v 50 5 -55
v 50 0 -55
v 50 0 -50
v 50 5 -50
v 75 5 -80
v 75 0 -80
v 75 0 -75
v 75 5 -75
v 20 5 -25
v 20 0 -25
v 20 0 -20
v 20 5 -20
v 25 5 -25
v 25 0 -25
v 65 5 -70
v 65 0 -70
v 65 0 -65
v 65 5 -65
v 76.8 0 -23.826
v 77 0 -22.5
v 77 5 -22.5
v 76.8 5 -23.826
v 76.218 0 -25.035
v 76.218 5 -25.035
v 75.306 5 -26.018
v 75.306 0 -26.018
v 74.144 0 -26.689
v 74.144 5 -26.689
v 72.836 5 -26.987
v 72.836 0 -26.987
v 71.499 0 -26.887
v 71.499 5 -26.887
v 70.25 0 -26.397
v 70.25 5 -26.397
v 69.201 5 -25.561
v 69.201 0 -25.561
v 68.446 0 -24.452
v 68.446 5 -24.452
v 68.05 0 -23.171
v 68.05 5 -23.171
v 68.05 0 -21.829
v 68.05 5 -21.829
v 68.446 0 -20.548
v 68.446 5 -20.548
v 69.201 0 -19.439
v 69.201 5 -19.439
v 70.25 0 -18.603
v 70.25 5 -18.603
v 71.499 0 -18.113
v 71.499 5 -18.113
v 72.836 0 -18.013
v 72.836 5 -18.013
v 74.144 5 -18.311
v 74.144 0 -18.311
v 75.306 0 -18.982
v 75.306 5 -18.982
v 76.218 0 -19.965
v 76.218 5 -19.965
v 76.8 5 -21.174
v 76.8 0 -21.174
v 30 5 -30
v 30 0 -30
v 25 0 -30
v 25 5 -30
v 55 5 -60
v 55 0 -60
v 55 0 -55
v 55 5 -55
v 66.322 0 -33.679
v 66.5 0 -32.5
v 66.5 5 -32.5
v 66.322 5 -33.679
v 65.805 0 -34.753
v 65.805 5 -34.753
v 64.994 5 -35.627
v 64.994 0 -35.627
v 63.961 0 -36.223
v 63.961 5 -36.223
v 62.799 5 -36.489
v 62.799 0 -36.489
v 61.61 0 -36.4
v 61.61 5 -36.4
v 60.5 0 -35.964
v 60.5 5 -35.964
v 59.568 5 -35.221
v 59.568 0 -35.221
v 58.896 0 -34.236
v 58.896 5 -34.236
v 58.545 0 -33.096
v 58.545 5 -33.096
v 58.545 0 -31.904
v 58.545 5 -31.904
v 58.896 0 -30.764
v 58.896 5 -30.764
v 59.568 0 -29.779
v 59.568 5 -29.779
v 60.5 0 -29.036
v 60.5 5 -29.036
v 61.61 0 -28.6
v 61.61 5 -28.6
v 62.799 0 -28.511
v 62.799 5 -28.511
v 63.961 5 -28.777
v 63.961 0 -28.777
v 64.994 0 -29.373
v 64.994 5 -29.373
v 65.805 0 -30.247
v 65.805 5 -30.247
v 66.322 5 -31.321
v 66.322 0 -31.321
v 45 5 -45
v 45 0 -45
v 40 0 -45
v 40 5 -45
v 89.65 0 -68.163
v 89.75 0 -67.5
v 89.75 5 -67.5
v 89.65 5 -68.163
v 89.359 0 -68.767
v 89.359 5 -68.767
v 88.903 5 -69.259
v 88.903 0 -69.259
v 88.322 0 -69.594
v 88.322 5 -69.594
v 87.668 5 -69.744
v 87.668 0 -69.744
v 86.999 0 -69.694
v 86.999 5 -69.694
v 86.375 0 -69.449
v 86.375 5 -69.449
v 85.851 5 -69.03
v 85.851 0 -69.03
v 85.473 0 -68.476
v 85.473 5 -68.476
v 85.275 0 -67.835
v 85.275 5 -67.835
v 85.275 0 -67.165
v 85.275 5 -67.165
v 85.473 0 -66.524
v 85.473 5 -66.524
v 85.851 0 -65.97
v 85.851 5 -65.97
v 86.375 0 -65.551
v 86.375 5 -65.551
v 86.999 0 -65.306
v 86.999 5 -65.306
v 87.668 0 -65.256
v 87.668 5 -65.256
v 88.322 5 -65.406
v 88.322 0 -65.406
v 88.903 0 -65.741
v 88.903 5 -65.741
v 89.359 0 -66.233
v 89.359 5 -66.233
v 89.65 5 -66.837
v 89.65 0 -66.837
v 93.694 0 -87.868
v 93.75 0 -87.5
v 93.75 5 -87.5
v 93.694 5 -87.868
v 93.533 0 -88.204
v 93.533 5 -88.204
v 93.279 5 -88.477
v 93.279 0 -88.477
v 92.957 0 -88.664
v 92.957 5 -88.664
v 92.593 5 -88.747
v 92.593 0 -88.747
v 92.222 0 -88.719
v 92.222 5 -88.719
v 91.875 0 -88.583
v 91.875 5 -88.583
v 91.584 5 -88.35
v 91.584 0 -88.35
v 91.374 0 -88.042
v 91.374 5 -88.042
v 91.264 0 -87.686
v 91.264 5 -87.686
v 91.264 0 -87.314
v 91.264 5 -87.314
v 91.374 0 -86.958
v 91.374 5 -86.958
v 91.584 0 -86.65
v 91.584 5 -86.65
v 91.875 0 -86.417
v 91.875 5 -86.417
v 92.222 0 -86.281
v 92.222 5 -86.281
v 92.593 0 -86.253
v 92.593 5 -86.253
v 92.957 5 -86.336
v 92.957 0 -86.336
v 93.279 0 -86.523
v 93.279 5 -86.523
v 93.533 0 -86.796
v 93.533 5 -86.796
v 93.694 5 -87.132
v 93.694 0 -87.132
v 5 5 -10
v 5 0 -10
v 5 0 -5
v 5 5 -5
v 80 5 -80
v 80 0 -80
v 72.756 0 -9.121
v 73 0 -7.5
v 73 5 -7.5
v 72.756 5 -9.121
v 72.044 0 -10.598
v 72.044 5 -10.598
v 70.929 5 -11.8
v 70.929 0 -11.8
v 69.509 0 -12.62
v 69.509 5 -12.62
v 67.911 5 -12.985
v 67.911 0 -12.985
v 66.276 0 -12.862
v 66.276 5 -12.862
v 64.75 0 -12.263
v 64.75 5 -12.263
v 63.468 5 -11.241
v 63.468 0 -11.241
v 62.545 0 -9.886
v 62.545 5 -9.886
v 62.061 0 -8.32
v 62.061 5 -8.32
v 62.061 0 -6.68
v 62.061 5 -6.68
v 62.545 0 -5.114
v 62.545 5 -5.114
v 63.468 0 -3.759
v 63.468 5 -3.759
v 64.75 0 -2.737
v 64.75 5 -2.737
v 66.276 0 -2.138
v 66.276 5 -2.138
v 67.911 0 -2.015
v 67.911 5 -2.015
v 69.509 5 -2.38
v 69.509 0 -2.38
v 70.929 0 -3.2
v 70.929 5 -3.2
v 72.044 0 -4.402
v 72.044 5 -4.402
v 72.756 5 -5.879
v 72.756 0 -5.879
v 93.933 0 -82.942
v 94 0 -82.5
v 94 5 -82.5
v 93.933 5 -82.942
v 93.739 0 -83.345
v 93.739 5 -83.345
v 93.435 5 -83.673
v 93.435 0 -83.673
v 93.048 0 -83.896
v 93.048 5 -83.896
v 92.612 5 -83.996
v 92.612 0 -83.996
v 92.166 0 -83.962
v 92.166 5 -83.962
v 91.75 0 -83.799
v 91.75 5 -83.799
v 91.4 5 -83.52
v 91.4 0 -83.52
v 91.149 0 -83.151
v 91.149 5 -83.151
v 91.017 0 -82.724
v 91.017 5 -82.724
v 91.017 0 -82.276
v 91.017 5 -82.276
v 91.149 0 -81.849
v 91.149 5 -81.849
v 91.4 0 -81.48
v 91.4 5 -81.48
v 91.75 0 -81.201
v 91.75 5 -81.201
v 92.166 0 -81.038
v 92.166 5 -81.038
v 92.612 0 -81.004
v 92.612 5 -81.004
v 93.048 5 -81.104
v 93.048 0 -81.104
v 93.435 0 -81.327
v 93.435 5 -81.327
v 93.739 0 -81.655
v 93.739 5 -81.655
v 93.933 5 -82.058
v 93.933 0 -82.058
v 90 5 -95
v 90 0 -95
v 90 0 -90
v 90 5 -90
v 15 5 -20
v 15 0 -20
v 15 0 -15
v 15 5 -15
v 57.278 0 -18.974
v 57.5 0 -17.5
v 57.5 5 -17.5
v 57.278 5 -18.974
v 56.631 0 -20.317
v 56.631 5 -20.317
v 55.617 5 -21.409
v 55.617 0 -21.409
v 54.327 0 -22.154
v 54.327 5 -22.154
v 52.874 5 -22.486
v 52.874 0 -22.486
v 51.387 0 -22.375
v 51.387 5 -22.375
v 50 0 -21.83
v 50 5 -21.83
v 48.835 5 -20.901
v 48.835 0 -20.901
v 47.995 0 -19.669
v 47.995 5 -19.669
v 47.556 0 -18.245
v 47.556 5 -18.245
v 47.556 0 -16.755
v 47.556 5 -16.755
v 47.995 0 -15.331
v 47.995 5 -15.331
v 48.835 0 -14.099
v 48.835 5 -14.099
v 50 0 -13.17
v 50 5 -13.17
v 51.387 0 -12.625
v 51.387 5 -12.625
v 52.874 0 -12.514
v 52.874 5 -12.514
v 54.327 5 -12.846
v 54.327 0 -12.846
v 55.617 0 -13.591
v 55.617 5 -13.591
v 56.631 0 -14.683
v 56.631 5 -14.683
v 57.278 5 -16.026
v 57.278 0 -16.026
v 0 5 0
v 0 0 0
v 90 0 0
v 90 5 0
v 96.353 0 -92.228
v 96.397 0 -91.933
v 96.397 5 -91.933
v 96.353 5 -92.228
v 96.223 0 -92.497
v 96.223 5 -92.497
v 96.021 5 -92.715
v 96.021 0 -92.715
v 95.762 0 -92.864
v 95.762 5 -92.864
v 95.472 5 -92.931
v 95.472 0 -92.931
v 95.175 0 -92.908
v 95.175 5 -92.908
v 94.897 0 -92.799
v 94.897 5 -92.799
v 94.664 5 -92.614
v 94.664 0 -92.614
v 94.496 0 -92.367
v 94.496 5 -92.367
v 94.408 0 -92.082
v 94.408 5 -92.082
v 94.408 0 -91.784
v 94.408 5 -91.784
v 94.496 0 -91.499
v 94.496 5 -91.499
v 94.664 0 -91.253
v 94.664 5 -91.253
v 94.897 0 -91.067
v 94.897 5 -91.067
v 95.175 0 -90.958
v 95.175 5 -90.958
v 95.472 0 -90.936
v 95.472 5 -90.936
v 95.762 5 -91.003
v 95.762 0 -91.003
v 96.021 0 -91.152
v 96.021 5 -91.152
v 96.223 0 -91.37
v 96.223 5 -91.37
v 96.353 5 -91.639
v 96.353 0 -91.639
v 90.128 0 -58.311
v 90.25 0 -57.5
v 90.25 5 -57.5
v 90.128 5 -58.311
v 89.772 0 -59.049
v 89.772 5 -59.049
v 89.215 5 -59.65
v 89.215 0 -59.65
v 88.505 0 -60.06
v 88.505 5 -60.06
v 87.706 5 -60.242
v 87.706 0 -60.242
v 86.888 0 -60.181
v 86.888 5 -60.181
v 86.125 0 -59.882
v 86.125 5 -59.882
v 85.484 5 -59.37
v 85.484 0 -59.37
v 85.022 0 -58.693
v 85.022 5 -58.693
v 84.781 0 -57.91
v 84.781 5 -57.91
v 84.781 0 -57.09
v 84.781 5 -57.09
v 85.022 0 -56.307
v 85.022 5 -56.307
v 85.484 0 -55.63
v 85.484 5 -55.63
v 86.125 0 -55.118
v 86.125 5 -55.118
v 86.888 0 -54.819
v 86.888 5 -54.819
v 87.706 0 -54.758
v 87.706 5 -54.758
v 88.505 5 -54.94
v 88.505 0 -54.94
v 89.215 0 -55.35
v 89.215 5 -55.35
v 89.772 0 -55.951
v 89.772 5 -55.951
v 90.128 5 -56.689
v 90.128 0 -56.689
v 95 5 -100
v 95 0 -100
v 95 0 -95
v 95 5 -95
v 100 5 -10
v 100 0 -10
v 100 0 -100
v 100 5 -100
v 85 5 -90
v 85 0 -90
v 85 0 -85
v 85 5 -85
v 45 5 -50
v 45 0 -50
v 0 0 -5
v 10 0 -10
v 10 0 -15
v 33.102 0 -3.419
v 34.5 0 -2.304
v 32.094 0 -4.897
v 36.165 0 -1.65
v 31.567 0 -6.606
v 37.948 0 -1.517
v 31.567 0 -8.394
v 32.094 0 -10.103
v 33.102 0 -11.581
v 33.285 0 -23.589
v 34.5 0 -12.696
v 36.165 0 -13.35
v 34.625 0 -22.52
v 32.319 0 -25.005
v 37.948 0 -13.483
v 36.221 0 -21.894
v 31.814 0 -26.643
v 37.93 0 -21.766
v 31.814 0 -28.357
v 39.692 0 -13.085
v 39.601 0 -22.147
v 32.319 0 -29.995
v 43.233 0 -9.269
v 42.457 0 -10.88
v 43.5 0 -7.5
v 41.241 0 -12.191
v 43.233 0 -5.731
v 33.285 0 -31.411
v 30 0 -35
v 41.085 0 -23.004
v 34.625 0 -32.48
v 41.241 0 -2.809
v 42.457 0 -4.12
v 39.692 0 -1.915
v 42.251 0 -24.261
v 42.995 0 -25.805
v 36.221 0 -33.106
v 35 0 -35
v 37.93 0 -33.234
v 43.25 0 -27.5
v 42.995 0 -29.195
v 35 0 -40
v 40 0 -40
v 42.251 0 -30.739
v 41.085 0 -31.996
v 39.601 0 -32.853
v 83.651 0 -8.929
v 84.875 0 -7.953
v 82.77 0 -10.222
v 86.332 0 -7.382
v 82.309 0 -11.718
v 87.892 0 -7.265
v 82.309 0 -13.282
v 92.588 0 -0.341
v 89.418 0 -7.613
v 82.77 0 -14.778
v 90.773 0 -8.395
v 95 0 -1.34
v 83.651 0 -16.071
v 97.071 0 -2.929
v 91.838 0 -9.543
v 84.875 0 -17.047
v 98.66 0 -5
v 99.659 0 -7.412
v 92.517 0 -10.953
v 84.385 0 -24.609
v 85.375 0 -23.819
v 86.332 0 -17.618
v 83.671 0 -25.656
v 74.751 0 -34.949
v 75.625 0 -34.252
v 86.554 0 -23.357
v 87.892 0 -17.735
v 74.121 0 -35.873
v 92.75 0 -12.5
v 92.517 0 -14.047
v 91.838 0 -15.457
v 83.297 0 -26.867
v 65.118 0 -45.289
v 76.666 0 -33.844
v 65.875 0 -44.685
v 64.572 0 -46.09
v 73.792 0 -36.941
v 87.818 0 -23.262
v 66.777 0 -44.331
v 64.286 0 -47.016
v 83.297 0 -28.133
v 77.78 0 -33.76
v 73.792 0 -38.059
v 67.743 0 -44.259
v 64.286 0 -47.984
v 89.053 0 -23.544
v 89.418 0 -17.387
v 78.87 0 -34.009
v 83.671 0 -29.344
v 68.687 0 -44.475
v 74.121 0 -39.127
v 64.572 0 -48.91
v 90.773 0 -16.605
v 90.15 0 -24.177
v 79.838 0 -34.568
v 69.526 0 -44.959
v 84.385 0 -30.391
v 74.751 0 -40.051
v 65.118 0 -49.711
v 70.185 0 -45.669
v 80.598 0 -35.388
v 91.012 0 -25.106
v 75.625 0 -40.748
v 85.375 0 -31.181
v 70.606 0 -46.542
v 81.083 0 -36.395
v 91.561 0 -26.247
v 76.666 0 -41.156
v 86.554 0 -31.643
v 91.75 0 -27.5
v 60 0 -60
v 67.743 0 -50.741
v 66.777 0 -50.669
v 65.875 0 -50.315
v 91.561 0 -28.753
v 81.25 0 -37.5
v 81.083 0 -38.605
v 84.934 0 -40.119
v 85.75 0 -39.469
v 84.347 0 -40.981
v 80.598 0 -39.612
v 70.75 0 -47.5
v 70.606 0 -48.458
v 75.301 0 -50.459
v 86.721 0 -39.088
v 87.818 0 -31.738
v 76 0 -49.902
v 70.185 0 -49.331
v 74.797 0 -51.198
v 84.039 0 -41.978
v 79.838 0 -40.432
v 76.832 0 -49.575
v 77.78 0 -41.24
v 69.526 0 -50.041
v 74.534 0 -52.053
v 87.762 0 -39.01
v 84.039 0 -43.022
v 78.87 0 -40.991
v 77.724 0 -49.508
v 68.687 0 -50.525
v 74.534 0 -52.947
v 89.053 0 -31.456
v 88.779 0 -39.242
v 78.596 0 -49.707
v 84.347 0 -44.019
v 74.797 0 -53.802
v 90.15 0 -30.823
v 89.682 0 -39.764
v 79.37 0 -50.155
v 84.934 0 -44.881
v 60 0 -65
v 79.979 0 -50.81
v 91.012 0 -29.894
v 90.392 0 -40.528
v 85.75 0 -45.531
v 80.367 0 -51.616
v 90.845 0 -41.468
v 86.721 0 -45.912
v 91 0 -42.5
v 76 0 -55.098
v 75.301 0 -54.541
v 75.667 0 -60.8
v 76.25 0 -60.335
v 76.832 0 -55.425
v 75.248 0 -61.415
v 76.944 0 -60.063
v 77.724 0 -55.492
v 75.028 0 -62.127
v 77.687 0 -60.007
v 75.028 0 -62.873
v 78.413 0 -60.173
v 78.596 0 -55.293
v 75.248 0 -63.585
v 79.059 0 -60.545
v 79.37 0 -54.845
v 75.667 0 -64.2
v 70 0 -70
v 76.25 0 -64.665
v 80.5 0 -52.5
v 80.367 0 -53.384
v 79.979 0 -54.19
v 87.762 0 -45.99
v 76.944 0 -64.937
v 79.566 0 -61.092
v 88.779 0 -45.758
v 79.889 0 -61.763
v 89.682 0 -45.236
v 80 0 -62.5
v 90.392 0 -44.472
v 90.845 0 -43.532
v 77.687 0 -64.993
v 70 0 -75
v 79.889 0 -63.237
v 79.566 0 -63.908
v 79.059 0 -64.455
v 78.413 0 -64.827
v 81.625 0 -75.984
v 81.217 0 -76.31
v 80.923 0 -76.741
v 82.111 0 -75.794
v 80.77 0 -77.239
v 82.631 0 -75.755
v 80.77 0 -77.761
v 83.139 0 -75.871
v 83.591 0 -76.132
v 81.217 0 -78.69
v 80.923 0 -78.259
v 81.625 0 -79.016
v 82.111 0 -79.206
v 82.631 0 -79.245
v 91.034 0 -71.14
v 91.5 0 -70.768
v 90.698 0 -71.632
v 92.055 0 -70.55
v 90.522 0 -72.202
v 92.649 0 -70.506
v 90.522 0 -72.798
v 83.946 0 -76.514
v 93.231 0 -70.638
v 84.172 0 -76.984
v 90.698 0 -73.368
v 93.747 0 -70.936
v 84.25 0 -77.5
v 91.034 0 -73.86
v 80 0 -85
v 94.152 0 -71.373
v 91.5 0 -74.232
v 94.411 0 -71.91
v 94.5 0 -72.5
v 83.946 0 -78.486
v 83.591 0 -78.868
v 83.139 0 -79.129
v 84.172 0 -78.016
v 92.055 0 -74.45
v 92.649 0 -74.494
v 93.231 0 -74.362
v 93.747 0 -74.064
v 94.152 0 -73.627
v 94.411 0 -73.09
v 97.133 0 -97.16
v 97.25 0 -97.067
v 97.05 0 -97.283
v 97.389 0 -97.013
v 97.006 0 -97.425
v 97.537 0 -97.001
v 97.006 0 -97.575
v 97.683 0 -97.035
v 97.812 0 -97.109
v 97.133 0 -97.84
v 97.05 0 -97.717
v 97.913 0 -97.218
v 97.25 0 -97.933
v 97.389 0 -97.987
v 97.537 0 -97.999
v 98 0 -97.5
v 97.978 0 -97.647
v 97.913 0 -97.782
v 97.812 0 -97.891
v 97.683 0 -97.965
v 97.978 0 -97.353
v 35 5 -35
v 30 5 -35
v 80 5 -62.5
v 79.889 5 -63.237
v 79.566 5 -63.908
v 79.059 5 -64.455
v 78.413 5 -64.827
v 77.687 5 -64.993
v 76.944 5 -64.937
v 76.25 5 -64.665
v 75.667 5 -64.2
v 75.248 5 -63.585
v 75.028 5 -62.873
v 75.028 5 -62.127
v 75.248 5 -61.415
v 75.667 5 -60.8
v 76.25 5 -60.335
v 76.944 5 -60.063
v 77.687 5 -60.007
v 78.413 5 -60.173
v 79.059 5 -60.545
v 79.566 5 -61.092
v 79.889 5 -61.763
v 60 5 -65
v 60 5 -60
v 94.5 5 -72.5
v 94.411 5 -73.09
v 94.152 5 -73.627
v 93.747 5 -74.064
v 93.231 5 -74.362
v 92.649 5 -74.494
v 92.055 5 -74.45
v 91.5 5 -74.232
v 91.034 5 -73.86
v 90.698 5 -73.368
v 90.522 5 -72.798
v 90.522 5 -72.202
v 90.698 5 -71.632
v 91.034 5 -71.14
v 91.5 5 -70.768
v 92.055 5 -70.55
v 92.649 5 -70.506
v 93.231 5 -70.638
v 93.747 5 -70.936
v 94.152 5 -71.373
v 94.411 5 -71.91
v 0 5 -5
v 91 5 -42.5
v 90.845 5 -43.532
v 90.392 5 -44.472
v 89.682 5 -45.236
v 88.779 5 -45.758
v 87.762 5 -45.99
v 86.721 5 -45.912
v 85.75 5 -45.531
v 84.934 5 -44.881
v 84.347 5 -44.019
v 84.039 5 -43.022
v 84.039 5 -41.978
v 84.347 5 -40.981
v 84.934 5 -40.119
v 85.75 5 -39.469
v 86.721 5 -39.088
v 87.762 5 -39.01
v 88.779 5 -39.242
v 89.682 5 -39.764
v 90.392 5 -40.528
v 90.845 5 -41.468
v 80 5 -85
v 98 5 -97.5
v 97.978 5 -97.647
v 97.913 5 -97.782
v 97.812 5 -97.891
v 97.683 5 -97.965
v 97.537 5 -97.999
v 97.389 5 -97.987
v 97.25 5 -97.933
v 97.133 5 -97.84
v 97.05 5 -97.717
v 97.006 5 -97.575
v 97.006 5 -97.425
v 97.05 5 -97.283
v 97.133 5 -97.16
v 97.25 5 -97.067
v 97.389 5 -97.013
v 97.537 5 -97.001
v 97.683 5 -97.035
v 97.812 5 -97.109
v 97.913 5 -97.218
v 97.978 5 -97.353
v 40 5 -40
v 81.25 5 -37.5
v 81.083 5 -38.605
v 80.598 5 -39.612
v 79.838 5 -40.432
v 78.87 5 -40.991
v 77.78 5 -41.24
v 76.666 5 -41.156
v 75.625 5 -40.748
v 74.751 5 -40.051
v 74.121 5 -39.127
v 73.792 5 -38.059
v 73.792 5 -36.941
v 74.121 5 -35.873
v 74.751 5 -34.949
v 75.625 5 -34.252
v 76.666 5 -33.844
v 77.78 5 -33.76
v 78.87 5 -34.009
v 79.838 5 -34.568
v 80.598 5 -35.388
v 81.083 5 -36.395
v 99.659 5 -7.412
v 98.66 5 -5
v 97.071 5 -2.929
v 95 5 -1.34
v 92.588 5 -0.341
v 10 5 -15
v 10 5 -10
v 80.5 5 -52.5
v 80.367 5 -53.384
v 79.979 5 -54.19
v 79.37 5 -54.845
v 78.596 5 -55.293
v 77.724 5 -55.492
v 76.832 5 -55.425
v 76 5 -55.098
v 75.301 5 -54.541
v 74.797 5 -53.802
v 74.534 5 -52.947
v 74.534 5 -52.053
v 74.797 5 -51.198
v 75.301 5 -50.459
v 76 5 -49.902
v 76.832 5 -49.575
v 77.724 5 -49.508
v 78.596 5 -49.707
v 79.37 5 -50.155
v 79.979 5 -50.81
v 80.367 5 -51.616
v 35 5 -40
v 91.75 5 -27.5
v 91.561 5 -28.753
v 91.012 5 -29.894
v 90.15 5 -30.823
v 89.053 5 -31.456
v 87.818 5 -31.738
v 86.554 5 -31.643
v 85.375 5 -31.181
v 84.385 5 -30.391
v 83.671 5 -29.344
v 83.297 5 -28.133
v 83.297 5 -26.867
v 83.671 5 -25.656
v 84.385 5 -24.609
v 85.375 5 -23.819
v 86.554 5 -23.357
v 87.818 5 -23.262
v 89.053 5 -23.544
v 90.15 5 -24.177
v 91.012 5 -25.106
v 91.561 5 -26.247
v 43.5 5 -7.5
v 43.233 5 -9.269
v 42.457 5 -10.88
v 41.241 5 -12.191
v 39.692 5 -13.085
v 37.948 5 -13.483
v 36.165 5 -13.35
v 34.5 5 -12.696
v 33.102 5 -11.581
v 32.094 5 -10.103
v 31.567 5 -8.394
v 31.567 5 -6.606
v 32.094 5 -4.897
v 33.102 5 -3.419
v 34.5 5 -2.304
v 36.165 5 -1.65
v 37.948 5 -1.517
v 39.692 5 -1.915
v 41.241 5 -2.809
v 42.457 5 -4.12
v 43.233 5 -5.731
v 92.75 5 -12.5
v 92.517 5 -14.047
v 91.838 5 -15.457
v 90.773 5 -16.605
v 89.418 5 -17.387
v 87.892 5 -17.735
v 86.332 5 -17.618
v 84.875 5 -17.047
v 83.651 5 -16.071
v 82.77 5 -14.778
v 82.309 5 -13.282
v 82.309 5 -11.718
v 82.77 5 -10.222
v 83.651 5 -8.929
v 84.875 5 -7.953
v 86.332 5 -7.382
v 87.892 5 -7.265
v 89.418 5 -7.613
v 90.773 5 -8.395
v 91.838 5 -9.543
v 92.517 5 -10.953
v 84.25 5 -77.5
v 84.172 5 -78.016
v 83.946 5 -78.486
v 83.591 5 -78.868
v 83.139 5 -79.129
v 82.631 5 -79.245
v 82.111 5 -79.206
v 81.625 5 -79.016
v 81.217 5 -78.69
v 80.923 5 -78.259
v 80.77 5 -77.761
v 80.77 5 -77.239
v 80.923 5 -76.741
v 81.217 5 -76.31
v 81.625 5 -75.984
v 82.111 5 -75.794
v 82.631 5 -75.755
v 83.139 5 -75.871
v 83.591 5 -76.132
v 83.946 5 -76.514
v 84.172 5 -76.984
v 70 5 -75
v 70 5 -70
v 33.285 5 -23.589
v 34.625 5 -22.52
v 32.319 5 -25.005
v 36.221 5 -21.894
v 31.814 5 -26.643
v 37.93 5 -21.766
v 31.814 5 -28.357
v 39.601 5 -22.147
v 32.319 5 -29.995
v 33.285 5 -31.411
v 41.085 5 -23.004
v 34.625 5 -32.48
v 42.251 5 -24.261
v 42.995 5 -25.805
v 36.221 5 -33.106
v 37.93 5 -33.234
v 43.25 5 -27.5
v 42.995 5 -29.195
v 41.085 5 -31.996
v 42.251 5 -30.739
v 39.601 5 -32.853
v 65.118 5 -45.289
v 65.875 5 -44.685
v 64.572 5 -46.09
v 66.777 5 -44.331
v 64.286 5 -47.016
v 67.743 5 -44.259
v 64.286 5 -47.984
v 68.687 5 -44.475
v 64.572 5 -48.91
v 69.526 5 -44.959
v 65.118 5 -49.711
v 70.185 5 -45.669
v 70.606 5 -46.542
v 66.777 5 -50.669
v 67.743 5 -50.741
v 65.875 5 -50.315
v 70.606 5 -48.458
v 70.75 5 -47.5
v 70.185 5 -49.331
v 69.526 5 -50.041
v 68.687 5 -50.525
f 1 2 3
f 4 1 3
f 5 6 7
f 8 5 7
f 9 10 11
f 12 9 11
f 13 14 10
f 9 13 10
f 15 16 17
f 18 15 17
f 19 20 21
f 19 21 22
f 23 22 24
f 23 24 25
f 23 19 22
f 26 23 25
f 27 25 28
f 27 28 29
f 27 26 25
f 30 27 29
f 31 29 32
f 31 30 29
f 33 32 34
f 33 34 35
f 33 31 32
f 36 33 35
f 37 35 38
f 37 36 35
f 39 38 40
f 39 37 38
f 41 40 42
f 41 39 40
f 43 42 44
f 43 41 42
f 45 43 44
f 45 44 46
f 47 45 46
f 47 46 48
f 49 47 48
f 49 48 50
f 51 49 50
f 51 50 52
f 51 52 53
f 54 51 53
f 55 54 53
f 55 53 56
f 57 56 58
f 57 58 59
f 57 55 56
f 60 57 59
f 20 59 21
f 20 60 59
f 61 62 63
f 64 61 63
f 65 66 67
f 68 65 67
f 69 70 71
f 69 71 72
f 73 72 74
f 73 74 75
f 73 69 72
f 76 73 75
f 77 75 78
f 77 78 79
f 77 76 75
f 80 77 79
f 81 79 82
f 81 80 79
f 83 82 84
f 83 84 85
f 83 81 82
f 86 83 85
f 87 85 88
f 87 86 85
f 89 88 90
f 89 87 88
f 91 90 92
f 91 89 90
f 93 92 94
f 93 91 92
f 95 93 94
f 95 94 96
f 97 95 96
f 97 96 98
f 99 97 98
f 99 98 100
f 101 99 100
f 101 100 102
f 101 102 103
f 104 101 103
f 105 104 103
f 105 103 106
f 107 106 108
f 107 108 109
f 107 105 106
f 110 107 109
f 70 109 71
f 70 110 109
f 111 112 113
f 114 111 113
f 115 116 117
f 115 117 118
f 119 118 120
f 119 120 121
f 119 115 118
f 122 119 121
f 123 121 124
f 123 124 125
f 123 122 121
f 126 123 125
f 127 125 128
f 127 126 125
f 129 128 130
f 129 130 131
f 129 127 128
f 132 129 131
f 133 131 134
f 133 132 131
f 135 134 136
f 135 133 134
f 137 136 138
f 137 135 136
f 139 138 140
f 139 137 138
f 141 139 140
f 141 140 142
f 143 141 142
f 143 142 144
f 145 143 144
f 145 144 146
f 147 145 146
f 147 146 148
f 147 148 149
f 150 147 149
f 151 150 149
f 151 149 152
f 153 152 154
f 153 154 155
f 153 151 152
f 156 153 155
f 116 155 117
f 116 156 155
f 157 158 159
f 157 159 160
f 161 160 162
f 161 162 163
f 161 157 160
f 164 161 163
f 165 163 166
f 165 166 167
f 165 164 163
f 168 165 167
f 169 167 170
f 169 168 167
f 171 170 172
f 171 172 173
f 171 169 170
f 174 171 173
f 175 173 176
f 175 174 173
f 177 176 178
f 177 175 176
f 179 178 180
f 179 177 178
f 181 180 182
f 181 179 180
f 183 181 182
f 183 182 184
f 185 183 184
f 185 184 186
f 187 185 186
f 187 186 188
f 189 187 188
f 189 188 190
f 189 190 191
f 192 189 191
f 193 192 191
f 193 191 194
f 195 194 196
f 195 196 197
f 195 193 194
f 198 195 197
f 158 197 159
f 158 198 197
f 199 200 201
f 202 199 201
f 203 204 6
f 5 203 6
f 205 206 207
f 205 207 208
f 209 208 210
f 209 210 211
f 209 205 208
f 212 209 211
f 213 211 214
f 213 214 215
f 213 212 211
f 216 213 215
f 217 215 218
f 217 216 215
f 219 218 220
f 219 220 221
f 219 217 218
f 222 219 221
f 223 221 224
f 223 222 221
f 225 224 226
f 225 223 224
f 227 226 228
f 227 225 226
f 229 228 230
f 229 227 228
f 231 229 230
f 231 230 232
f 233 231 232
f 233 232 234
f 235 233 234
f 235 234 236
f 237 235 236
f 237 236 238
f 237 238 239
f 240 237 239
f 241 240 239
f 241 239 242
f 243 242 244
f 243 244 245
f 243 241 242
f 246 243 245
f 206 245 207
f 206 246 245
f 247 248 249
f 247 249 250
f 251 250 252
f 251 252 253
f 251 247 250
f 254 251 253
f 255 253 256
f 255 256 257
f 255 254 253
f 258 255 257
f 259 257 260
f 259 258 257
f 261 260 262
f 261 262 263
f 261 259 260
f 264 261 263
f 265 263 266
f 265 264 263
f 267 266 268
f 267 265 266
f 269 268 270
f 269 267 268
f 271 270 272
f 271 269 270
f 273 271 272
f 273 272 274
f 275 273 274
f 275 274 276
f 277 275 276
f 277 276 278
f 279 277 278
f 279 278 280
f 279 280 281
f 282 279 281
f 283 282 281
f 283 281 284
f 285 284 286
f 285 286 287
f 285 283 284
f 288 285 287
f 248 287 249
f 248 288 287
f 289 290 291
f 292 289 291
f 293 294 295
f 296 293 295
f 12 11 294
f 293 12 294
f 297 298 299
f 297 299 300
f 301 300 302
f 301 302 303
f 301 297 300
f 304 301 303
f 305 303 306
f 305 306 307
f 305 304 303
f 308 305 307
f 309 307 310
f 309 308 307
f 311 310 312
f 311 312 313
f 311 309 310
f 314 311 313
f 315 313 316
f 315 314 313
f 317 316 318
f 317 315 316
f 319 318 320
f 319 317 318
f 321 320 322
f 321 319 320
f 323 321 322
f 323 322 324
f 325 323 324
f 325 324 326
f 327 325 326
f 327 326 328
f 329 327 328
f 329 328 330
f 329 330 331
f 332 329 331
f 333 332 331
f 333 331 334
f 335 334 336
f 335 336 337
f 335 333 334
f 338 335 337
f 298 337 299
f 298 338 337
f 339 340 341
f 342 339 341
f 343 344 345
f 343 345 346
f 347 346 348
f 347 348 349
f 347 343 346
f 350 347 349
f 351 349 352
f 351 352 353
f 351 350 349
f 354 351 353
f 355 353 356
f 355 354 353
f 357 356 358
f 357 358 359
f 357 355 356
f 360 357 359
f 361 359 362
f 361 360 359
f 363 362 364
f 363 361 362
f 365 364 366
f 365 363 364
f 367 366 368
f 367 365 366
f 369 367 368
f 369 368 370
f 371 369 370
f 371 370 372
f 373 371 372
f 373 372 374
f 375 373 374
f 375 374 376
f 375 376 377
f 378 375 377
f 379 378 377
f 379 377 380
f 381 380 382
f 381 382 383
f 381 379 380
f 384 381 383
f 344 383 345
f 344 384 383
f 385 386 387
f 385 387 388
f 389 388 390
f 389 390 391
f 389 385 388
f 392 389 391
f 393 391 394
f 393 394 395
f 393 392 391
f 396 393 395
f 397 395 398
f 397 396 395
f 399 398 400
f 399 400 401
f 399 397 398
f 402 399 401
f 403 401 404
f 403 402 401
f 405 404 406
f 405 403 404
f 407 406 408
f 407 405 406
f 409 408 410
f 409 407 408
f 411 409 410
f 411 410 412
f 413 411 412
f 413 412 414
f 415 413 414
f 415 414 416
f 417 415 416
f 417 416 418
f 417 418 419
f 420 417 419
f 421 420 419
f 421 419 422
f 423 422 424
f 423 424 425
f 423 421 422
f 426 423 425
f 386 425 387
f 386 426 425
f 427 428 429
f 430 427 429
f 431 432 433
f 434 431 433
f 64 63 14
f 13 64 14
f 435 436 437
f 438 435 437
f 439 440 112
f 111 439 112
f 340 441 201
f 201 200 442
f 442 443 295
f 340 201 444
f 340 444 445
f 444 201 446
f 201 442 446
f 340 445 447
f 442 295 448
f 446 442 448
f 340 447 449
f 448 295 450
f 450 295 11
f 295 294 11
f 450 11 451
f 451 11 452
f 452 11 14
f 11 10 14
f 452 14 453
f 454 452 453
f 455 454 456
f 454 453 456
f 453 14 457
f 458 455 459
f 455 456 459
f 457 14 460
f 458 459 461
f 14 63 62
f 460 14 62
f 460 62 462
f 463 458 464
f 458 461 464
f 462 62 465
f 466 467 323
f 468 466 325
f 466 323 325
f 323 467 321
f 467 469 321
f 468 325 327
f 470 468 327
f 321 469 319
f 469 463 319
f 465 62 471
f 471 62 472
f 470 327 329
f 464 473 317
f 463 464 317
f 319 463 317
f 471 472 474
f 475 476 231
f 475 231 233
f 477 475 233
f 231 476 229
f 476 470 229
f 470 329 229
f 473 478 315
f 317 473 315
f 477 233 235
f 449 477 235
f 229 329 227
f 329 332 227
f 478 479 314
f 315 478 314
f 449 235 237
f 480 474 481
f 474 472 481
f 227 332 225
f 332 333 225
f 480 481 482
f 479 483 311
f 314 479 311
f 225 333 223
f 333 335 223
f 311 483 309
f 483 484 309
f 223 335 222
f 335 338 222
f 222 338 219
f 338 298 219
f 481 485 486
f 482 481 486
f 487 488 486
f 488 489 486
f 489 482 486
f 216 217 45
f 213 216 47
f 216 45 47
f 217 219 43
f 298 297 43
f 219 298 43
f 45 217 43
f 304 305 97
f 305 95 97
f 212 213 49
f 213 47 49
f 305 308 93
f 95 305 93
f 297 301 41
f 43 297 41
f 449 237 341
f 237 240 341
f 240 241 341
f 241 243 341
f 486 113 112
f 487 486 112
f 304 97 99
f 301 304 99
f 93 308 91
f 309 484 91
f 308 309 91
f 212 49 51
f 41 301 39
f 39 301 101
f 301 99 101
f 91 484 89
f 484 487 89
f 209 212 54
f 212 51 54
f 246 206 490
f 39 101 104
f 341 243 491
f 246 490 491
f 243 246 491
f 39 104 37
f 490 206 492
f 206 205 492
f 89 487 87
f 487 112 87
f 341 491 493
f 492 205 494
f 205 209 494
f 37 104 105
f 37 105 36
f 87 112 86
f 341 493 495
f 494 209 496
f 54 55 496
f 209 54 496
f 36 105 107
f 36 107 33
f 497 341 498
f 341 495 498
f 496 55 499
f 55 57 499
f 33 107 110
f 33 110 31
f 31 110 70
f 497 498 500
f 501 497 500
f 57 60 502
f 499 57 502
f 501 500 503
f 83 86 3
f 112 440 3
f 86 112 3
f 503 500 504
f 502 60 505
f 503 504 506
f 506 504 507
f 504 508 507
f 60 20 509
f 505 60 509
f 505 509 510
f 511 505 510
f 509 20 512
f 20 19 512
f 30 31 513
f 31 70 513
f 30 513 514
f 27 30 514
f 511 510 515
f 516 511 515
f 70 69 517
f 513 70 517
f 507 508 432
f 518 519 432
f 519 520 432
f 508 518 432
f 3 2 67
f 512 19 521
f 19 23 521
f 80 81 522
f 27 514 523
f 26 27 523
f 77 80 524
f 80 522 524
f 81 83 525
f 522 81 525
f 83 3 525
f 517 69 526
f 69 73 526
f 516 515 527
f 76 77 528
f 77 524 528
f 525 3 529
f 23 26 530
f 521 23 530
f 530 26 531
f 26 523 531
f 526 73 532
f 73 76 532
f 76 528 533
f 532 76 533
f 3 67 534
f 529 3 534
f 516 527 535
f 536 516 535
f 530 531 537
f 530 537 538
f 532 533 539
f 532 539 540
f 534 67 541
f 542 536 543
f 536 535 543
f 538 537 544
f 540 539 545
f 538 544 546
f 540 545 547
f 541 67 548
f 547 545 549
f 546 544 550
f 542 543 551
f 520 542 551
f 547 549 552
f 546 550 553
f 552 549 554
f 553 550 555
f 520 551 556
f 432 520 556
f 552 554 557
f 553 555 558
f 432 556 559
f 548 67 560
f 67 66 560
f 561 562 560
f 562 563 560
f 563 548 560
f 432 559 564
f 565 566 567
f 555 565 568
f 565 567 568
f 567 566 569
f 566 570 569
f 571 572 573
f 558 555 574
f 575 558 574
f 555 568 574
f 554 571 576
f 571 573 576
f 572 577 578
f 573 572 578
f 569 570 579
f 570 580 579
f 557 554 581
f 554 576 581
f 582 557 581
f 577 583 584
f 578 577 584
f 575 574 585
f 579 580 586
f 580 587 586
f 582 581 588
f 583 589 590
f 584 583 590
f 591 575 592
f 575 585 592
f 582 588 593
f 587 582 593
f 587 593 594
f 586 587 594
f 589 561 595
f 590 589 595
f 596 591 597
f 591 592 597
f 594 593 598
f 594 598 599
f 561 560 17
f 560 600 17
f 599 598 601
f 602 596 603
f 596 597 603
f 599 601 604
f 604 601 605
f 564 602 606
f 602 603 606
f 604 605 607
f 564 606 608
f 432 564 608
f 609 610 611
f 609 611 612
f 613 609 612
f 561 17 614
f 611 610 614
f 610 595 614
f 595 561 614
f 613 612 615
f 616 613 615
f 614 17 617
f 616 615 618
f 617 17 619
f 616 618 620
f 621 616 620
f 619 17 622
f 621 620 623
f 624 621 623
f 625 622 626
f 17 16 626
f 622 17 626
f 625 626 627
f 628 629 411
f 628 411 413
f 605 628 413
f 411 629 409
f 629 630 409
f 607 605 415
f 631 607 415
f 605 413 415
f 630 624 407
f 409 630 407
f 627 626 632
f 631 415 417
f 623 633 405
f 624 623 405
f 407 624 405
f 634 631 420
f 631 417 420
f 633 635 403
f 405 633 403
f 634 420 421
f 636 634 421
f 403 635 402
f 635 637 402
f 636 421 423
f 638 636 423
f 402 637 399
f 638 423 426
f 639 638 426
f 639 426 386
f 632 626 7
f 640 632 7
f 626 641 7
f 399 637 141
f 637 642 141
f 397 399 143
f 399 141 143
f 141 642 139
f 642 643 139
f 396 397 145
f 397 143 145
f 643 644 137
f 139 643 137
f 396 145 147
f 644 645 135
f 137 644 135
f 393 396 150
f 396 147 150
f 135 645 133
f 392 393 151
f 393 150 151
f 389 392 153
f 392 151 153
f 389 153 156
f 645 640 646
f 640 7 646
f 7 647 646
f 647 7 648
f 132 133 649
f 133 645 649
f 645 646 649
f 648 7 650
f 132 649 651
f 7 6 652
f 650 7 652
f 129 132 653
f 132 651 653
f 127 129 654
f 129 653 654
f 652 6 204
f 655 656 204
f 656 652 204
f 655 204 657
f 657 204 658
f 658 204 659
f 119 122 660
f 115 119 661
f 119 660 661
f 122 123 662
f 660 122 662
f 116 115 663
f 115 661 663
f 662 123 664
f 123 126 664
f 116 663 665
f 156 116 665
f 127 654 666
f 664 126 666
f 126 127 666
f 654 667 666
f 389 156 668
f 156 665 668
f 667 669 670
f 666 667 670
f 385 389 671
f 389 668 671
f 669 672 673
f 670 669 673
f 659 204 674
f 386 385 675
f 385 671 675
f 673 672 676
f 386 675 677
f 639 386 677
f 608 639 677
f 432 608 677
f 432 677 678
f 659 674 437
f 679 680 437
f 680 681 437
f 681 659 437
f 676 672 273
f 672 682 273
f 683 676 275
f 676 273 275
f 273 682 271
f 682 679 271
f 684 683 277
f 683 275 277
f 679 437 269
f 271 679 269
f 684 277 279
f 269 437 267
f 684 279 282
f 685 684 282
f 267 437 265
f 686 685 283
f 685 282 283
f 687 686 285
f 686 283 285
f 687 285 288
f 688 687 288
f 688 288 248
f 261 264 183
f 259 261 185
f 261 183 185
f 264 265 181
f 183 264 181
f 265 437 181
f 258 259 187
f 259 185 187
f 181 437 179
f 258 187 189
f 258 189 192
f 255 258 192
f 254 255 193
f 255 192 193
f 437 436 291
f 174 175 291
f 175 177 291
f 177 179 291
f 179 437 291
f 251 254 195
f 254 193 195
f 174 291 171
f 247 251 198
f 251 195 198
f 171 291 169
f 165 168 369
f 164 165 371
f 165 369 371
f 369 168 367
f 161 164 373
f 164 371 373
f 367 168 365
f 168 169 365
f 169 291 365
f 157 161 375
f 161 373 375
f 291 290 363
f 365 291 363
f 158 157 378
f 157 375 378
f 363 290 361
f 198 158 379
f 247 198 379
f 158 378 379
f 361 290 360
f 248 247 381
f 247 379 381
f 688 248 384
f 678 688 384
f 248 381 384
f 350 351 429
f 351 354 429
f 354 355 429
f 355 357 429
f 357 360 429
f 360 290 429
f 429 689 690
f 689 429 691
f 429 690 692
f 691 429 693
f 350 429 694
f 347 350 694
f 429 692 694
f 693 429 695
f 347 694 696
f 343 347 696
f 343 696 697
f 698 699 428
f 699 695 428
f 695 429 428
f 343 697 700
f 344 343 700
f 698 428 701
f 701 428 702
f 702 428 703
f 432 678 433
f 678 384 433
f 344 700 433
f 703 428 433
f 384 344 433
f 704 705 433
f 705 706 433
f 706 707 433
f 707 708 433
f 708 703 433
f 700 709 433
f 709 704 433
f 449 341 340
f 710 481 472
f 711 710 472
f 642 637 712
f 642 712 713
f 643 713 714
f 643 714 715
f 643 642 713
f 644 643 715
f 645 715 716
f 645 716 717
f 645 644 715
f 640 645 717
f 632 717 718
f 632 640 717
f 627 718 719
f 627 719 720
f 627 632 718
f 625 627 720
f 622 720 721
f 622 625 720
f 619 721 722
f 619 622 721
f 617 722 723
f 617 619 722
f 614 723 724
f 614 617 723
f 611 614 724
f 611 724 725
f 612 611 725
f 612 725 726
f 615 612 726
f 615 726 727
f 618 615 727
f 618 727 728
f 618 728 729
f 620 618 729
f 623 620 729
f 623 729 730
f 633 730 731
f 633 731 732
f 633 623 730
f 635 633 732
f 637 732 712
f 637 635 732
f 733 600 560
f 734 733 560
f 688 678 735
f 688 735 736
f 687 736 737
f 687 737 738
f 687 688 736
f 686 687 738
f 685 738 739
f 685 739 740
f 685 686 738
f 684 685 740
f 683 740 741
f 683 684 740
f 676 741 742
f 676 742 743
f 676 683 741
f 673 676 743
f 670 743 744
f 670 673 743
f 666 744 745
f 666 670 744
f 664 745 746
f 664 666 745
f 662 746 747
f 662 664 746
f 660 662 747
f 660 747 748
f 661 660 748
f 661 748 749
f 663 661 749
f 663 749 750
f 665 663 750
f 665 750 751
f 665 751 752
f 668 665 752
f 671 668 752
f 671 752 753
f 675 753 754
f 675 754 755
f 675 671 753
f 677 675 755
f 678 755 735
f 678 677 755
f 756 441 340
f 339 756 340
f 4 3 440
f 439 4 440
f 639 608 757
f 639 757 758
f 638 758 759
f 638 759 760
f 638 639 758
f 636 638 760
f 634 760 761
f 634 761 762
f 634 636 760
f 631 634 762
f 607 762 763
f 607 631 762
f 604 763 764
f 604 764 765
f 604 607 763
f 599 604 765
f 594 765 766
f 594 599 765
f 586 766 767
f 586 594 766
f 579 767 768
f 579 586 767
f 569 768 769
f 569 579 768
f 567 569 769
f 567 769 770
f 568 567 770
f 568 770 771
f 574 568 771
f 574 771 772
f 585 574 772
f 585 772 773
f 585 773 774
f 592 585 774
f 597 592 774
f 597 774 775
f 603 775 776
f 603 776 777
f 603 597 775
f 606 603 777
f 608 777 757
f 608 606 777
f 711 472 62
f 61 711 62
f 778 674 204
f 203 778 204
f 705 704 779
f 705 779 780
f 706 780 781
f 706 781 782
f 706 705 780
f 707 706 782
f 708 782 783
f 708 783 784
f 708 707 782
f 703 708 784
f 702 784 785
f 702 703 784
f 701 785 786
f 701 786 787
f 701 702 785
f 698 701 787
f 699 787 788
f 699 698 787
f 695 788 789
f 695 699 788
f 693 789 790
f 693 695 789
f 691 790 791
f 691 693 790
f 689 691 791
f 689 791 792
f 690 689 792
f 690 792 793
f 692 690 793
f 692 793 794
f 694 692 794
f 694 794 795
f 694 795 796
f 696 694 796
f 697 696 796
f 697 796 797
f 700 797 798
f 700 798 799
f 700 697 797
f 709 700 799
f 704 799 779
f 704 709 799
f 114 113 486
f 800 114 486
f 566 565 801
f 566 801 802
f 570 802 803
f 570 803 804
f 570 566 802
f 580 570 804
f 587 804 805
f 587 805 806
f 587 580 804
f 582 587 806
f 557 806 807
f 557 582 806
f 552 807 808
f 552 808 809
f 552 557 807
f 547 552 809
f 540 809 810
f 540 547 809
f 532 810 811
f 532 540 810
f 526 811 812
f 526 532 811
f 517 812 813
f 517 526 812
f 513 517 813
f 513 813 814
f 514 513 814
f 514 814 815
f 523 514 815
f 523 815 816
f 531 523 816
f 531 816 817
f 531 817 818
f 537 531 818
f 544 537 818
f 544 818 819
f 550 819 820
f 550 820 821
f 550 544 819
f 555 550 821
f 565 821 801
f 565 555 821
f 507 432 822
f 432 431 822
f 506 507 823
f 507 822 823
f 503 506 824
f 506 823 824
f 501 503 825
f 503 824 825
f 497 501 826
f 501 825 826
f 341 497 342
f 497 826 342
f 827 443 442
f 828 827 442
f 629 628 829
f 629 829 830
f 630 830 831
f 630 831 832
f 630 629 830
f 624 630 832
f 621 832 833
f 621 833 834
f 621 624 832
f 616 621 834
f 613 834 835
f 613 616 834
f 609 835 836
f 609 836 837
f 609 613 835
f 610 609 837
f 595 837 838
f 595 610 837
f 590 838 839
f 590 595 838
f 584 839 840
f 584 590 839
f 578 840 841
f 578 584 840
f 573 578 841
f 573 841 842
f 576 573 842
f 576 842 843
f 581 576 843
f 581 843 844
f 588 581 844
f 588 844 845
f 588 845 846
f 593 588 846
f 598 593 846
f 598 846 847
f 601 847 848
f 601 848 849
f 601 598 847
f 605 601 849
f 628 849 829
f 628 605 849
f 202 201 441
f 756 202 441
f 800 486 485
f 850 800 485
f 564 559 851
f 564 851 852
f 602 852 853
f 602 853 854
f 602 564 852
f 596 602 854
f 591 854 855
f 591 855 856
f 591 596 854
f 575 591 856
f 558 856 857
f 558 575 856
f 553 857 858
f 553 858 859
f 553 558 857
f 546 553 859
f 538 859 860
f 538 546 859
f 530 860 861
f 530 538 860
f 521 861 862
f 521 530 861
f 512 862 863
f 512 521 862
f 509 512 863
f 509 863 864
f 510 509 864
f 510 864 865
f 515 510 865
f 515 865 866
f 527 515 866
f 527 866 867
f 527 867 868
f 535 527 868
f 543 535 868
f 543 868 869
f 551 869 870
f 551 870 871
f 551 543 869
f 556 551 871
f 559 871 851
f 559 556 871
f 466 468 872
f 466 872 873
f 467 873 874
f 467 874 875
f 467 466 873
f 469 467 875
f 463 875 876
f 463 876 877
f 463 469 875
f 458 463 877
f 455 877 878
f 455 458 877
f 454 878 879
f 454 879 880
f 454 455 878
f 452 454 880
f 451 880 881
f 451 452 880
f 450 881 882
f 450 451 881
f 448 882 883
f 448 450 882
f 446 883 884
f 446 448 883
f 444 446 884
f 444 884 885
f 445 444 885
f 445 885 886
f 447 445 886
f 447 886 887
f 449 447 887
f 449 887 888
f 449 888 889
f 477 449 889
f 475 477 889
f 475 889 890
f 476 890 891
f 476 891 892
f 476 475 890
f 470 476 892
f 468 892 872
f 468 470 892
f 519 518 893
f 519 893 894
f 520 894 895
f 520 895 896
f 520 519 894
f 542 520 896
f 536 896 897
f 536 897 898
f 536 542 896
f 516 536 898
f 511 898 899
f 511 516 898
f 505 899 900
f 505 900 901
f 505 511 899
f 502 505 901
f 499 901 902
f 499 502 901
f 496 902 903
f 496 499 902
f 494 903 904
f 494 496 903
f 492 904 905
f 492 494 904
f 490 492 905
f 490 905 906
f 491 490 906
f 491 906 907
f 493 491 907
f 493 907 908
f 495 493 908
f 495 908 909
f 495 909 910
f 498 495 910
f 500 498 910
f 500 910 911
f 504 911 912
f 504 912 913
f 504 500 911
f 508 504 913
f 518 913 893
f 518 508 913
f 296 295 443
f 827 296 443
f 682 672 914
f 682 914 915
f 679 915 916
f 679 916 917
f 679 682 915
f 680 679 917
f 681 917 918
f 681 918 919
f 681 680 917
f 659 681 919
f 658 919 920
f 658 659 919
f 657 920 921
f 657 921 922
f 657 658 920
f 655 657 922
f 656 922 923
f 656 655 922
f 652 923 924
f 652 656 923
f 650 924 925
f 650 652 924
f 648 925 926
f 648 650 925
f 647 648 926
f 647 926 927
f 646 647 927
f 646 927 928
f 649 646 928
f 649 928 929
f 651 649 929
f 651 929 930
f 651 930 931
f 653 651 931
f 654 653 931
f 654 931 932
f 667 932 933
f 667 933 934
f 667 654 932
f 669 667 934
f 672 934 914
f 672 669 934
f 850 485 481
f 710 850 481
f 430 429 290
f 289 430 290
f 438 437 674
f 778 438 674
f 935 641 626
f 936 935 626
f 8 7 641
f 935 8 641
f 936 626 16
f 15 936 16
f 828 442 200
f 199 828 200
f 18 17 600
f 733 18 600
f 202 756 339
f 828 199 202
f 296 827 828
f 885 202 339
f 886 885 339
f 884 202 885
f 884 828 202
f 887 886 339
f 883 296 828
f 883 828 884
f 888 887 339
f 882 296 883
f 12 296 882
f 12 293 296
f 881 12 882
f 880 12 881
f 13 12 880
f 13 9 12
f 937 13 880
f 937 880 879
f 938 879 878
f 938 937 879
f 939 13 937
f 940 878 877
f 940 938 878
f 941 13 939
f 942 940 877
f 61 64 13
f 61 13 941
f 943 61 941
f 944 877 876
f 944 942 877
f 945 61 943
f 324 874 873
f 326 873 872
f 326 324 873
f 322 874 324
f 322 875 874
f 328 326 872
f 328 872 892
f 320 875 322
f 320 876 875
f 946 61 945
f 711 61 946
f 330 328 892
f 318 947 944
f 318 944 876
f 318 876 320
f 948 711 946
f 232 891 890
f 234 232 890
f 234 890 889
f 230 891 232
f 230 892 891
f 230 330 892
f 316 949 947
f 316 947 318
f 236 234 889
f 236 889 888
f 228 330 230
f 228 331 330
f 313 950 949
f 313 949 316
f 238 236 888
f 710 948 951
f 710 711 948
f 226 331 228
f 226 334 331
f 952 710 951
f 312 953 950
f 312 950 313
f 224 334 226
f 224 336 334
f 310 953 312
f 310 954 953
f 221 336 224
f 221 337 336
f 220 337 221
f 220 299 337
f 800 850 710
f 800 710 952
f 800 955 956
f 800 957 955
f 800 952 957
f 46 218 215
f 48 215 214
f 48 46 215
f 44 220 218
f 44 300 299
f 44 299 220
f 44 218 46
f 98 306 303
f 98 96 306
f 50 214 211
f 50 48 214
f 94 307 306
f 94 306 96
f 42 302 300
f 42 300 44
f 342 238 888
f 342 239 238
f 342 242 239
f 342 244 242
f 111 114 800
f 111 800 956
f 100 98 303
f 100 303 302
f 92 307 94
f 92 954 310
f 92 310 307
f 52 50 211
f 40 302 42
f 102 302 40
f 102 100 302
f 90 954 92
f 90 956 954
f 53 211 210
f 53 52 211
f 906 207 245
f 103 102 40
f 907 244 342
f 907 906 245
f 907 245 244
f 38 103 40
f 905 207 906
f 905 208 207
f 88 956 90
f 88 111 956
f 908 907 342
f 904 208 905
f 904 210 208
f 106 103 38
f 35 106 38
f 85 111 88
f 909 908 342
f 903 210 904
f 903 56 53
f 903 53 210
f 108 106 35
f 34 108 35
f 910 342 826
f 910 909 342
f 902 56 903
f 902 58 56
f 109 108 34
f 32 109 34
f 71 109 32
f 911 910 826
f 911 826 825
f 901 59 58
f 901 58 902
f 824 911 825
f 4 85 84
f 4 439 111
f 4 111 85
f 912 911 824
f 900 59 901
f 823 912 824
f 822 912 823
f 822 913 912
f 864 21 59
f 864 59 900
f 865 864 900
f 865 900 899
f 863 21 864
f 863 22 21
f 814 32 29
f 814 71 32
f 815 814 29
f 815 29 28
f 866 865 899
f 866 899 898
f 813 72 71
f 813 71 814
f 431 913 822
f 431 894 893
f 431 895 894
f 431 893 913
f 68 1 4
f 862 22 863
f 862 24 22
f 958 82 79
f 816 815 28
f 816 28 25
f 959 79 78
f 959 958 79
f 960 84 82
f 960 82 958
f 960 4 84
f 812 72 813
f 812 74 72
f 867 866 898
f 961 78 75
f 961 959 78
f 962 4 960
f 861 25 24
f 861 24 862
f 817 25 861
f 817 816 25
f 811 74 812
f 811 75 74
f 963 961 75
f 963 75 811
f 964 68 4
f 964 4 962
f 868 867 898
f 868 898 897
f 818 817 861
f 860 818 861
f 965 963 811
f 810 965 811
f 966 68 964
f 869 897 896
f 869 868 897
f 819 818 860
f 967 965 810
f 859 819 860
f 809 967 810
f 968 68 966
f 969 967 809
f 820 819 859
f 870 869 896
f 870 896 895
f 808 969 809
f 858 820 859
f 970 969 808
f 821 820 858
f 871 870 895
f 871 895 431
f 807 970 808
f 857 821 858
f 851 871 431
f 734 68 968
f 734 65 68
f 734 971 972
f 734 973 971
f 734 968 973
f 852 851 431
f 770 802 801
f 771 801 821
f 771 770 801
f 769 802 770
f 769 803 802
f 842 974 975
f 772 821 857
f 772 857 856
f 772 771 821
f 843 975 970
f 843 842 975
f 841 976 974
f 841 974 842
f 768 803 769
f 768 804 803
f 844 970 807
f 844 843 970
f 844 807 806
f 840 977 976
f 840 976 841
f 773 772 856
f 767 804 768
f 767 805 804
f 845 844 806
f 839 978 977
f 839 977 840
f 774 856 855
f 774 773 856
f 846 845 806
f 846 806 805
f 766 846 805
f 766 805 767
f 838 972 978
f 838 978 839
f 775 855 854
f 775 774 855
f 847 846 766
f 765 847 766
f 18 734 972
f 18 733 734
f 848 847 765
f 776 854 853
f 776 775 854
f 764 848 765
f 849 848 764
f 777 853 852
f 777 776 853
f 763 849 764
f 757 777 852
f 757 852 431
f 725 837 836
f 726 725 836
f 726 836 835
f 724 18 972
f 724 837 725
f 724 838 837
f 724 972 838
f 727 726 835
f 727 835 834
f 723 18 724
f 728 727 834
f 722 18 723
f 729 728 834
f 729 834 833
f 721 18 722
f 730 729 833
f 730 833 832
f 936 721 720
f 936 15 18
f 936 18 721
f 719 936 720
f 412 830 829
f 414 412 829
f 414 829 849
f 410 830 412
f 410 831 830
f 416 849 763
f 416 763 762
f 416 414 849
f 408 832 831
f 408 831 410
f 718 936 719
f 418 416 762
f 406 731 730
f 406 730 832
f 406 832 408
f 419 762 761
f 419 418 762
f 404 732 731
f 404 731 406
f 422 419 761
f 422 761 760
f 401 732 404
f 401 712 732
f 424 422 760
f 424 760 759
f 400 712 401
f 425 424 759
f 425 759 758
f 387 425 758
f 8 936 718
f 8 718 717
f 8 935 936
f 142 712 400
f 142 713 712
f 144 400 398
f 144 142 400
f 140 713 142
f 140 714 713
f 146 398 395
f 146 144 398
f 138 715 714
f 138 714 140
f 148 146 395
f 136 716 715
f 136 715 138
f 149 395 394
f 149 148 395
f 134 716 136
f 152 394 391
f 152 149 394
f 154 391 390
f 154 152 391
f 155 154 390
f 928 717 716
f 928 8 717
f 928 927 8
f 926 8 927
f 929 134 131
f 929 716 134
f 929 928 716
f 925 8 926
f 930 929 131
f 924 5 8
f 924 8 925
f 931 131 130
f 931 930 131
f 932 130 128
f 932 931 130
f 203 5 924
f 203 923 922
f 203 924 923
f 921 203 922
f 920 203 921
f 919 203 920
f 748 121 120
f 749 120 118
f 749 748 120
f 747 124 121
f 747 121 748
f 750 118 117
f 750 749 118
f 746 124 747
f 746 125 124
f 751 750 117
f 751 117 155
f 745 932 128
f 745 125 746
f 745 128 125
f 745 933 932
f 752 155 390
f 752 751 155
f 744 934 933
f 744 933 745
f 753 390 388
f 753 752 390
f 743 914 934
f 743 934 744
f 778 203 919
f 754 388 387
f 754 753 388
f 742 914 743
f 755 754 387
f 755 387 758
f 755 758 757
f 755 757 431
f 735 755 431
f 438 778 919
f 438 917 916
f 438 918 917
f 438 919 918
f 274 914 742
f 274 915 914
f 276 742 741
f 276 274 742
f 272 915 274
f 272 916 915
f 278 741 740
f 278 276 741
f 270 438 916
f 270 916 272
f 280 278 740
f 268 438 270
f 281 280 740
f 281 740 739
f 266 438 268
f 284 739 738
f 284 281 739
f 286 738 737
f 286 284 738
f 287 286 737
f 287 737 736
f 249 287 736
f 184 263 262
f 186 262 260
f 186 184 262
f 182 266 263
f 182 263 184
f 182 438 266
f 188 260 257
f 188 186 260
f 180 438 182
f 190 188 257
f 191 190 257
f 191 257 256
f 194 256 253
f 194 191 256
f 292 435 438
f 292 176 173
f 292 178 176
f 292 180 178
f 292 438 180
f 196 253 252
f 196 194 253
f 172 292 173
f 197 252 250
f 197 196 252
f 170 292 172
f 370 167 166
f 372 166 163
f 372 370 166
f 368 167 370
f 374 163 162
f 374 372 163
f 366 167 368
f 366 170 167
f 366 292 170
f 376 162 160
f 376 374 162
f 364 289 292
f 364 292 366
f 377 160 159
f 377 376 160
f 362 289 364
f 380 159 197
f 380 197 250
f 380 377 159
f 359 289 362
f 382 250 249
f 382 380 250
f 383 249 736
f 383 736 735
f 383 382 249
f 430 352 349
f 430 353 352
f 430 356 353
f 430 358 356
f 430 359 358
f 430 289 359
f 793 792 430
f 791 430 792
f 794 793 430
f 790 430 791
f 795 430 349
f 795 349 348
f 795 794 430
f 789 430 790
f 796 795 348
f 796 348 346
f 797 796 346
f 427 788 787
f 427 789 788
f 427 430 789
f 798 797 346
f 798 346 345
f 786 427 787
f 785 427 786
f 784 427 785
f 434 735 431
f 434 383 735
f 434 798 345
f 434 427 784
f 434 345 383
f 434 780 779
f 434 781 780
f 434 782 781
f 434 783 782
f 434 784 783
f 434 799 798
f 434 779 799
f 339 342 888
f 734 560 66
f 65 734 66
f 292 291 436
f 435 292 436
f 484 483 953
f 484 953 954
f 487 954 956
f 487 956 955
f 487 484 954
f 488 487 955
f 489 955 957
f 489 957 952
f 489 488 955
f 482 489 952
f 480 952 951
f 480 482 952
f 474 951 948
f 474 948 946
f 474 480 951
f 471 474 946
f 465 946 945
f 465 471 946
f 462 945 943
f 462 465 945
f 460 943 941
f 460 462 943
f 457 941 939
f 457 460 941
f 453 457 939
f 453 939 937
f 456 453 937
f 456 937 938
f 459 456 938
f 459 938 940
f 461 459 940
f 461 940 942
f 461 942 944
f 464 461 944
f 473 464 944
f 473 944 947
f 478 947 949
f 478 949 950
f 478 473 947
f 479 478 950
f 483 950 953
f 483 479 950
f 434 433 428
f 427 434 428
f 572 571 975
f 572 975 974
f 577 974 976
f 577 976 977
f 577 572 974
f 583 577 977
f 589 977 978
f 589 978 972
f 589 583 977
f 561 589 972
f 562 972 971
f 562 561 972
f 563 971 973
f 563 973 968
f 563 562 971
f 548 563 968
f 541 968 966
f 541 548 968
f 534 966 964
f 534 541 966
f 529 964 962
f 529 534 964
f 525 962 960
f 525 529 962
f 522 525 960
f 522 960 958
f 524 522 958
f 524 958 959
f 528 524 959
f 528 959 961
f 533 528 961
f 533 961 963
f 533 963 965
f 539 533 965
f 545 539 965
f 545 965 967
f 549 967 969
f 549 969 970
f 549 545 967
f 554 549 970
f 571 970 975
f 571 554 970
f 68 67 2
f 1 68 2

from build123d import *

# Parameters (mm, degrees)
BOSS_EXTRUDE1_OUTLINE_R    = 6
BOSS_EXTRUDE1_OUTLINE_R_2  = 5.75
BOSS_EXTRUDE1_OUTLINE_R_3  = 5.5
BOSS_EXTRUDE1_OUTLINE_R_4  = 5
BOSS_EXTRUDE1_OUTLINE_R_5  = 4.5
BOSS_EXTRUDE1_OUTLINE_R_6  = 5.25
BOSS_EXTRUDE1_OUTLINE_R_7  = 4
BOSS_EXTRUDE1_OUTLINE_R_8  = 3.25
BOSS_EXTRUDE1_OUTLINE_R_9  = 4.25
BOSS_EXTRUDE1_OUTLINE_R_10 = 3.75
BOSS_EXTRUDE1_OUTLINE_R_11 = 3.5
BOSS_EXTRUDE1_OUTLINE_R_12 = 3
BOSS_EXTRUDE1_OUTLINE_R_13 = 2.75
BOSS_EXTRUDE1_OUTLINE_R_14 = 2.5
BOSS_EXTRUDE1_OUTLINE_R_15 = 2.25
BOSS_EXTRUDE1_OUTLINE_R_16 = 2
BOSS_EXTRUDE1_OUTLINE_R_17 = 1.75
BOSS_EXTRUDE1_OUTLINE_R_18 = 1.5
BOSS_EXTRUDE1_OUTLINE_R_19 = 1.25
BOSS_EXTRUDE1_OUTLINE_R_20 = 1
BOSS_EXTRUDE1_OUTLINE_R_21 = 0.5
BOSS_EXTRUDE1_DEPTH        = 5
FILLET1_R                  = 10


# Read off the part's stored shape, not the designer's step: Boss-Extrude1
with BuildPart() as part:
    # Boss-Extrude1 outline → Boss-Extrude1 (new body)
    with BuildSketch(Plane(origin=(0, 0, 0), x_dir=(1, 0, 0), z_dir=(0, 1, 0))):
        Polygon((60, 65), (60, 60), (55, 60), (55, 55), (50, 55), (50, 50), (45, 50), (45, 45), (40, 45), (40, 40), (35, 40), (35, 35), (30, 35), (30, 30), (25, 30), (25, 25), (20, 25), (20, 20), (15, 20), (15, 15), (10, 15), (10, 10), (5, 10), (5, 5), (0, 5), (0, 0), (100, 0), (100, 100), (95, 100), (95, 95), (90, 95), (90, 90), (85, 90), (85, 85), (80, 85), (80, 80), (75, 80), (75, 75), (70, 75), (70, 70), (65, 70), (65, 65), align=None)
        with Locations((37.5, 7.5)):
            Circle(BOSS_EXTRUDE1_OUTLINE_R, mode=Mode.SUBTRACT)
        with Locations((37.5, 27.5)):
            Circle(BOSS_EXTRUDE1_OUTLINE_R_2, mode=Mode.SUBTRACT)
        with Locations((67.5, 7.5)):
            Circle(BOSS_EXTRUDE1_OUTLINE_R_3, mode=Mode.SUBTRACT)
        with Locations((52.5, 17.5)):
            Circle(BOSS_EXTRUDE1_OUTLINE_R_4, mode=Mode.SUBTRACT)
        with Locations((72.5, 22.5)):
            Circle(BOSS_EXTRUDE1_OUTLINE_R_5, mode=Mode.SUBTRACT)
        with Locations((87.5, 12.5)):
            Circle(BOSS_EXTRUDE1_OUTLINE_R_6, mode=Mode.SUBTRACT)
        with Locations((62.5, 32.5)):
            Circle(BOSS_EXTRUDE1_OUTLINE_R_7, mode=Mode.SUBTRACT)
        with Locations((67.5, 47.5)):
            Circle(BOSS_EXTRUDE1_OUTLINE_R_8, mode=Mode.SUBTRACT)
        with Locations((87.5, 27.5)):
            Circle(BOSS_EXTRUDE1_OUTLINE_R_9, mode=Mode.SUBTRACT)
        with Locations((77.5, 37.5)):
            Circle(BOSS_EXTRUDE1_OUTLINE_R_10, mode=Mode.SUBTRACT)
        with Locations((87.5, 42.5)):
            Circle(BOSS_EXTRUDE1_OUTLINE_R_11, mode=Mode.SUBTRACT)
        with Locations((77.5, 52.5)):
            Circle(BOSS_EXTRUDE1_OUTLINE_R_12, mode=Mode.SUBTRACT)
        with Locations((87.5, 57.5)):
            Circle(BOSS_EXTRUDE1_OUTLINE_R_13, mode=Mode.SUBTRACT)
        with Locations((77.5, 62.5)):
            Circle(BOSS_EXTRUDE1_OUTLINE_R_14, mode=Mode.SUBTRACT)
        with Locations((87.5, 67.5)):
            Circle(BOSS_EXTRUDE1_OUTLINE_R_15, mode=Mode.SUBTRACT)
        with Locations((92.5, 72.5)):
            Circle(BOSS_EXTRUDE1_OUTLINE_R_16, mode=Mode.SUBTRACT)
        with Locations((82.5, 77.5)):
            Circle(BOSS_EXTRUDE1_OUTLINE_R_17, mode=Mode.SUBTRACT)
        with Locations((92.5, 82.5)):
            Circle(BOSS_EXTRUDE1_OUTLINE_R_18, mode=Mode.SUBTRACT)
        with Locations((92.5, 87.5)):
            Circle(BOSS_EXTRUDE1_OUTLINE_R_19, mode=Mode.SUBTRACT)
        with Locations((95.397156107, 91.933376666)):
            Circle(BOSS_EXTRUDE1_OUTLINE_R_20, mode=Mode.SUBTRACT)
        with Locations((97.5, 97.5)):
            Circle(BOSS_EXTRUDE1_OUTLINE_R_21, mode=Mode.SUBTRACT)
    extrude(amount=BOSS_EXTRUDE1_DEPTH)

    # Fillet1
    fillet1_edges = [part.edges().sort_by_distance(p)[0] for p in [
        (100, 2.5, 0),
    ]]
    fillet(fillet1_edges, radius=FILLET1_R)


solid = part.part
